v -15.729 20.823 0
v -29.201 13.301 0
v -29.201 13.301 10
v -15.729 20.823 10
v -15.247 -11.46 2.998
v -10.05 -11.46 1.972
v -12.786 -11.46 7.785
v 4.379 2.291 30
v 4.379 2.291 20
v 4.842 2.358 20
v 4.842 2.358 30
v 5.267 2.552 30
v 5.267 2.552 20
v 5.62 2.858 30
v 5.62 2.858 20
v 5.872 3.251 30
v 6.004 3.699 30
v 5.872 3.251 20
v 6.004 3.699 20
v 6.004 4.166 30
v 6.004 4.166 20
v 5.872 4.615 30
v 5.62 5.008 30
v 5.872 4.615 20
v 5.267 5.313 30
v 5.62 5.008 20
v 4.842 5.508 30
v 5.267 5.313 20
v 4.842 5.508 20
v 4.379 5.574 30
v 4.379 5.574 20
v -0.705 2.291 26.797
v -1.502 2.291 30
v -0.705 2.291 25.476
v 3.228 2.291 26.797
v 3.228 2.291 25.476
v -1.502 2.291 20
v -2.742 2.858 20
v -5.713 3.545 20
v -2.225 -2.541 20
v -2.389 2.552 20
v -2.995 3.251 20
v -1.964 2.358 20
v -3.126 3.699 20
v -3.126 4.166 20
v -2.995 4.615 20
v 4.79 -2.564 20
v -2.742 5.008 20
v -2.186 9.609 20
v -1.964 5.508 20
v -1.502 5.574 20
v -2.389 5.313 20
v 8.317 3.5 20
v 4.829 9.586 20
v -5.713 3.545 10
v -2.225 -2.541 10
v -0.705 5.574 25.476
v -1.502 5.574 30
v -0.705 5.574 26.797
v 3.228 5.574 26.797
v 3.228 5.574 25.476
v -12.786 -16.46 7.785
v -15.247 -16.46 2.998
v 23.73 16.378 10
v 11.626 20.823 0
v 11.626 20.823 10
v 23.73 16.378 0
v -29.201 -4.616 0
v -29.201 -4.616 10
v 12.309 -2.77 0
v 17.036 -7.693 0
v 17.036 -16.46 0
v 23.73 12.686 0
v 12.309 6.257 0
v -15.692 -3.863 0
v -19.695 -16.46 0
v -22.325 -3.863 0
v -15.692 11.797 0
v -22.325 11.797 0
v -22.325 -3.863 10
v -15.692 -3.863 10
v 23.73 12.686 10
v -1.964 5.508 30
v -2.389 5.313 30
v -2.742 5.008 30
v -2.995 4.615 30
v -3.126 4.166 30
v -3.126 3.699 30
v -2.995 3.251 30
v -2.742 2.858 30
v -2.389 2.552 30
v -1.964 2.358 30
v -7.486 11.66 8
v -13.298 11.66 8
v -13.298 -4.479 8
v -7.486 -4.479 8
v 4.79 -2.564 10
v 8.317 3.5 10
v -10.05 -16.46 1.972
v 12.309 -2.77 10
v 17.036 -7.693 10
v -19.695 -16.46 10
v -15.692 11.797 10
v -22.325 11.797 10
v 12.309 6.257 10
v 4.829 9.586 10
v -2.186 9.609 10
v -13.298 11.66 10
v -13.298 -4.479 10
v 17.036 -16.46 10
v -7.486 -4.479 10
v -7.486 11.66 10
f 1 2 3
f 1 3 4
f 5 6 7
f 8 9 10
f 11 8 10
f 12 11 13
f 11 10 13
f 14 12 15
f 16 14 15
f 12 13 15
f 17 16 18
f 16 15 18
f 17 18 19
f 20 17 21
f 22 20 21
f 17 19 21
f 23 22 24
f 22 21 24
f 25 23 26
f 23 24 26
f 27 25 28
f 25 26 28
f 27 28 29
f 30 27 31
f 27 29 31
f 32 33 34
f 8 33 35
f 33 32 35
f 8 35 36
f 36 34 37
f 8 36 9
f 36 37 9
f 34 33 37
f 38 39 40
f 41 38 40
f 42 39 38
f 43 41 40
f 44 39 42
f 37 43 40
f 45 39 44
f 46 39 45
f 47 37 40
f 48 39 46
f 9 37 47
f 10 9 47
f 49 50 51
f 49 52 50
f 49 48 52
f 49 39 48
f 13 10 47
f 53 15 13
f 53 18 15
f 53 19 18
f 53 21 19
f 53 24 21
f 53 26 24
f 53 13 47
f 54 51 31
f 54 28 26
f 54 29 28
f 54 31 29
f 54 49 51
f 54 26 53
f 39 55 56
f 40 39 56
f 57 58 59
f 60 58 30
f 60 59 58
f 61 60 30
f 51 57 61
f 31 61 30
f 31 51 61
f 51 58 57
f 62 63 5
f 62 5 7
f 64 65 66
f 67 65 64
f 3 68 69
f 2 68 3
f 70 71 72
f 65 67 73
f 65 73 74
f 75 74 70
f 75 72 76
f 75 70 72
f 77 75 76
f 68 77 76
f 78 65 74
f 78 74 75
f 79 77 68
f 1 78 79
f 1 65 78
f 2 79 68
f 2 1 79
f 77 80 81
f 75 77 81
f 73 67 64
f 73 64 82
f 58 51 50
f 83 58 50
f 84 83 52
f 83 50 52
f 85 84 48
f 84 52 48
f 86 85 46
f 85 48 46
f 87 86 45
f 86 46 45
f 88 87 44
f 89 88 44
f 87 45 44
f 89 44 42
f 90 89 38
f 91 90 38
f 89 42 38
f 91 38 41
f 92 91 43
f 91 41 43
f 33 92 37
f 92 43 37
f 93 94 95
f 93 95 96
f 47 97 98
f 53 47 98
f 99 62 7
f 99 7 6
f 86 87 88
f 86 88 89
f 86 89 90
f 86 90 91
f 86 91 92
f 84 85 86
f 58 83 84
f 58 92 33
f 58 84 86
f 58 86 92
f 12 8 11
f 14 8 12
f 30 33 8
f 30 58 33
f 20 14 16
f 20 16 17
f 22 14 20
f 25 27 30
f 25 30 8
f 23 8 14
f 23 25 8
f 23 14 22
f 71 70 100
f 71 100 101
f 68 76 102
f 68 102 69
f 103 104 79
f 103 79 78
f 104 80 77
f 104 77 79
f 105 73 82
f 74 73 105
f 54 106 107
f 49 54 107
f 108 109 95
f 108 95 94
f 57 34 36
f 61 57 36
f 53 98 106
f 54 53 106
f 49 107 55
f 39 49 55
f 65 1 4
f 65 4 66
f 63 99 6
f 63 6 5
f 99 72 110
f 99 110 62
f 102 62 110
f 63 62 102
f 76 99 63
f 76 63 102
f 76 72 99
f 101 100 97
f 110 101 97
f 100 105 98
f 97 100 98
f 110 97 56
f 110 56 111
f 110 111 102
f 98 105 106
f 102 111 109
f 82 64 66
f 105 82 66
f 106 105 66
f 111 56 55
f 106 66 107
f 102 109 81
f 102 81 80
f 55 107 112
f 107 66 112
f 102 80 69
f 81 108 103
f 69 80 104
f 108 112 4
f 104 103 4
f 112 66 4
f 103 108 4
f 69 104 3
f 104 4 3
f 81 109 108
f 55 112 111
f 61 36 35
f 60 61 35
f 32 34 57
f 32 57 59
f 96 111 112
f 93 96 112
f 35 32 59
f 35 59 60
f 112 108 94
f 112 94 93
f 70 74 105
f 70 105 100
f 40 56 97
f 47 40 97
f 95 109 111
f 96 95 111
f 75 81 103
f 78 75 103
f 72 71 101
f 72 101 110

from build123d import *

# Parameters (mm, degrees)
PAD_DEPTH       = 10
SKETCH001_W     = 6.633416
SKETCH001_H     = 15.660333
POCKET_DEPTH    = 10.001
SKETCH002_W     = 5.812787
SKETCH002_H     = 16.139036
POCKET001_DEPTH = 2
PAD001_DEPTH    = 10
PAD002_DEPTH    = 10
POCKET002_DEPTH = 5
SKETCH006_W     = 3.933146
SKETCH006_H     = 1.321291
POCKET003_DEPTH = 18.532975


with BuildPart() as part:
    # Sketch → Pad (new body)
    with BuildSketch(Plane.XY):
        Polygon((-15.728714, 20.823448), (11.625568, 20.823448), (23.729843, 16.378376), (23.729843, 12.685549), (12.309424, 6.257293), (12.309424, -2.769621), (17.036469, -7.693392), (17.036469, -16.460198), (-19.695082, -16.460198), (-29.200699, -4.616035), (-29.200699, 13.301021), align=None)
    extrude(amount=PAD_DEPTH)

    # Sketch001 → Pocket (cut, through all)
    with BuildSketch(Plane.XY.offset(10)):
        with Locations((-19.00863, 3.966925)):
            Rectangle(SKETCH001_W, SKETCH001_H)
    extrude(amount=-POCKET_DEPTH, mode=Mode.SUBTRACT)

    # Sketch002 → Pocket001 (cut)
    with BuildSketch(Plane.XY.offset(10)):
        with Locations((-10.392027, 3.590804)):
            Rectangle(SKETCH002_W, SKETCH002_H)
    extrude(amount=-POCKET001_DEPTH, mode=Mode.SUBTRACT)

    # Sketch003 → Pad001 (new body)
    with BuildSketch(Plane.XY.offset(10)):
        Polygon((4.789602, -2.563913), (8.316681, 3.499667), (4.829006, 9.585997), (-2.185748, 9.608747), (-5.712827, 3.545167), (-2.225152, -2.541163), align=None)
    extrude(amount=PAD001_DEPTH)

    # Sketch004 → Pad002 (new body)
    with BuildSketch(Plane.XY.offset(20)):
        with BuildLine():
            ThreePointArc((-1.50189, 5.573991), (-3.143149, 3.932732), (-1.50189, 2.291473))
            Line((-1.50189, 2.291473), (4.379285, 2.291473))
            ThreePointArc((4.379285, 2.291473), (6.020544, 3.932732), (4.379285, 5.573991))
            Line((-1.50189, 5.573991), (4.379285, 5.573991))
        make_face()
    extrude(amount=PAD002_DEPTH)

    # Sketch005 → Pocket002 (cut)
    with BuildSketch(Plane.XZ.offset(16.460198)):
        Polygon((-15.247426, 2.998008), (-12.785538, 7.785009), (-10.05011, 1.972221), align=None)
    extrude(amount=-POCKET002_DEPTH, mode=Mode.SUBTRACT)

    # Sketch006 → Pocket003 (cut, through all)
    with BuildSketch(Plane.XZ.offset(-2.291473)):
        with Locations((1.261401, 26.136292)):
            Rectangle(SKETCH006_W, SKETCH006_H)
    extrude(amount=-POCKET003_DEPTH, mode=Mode.SUBTRACT)


solid = part.part
